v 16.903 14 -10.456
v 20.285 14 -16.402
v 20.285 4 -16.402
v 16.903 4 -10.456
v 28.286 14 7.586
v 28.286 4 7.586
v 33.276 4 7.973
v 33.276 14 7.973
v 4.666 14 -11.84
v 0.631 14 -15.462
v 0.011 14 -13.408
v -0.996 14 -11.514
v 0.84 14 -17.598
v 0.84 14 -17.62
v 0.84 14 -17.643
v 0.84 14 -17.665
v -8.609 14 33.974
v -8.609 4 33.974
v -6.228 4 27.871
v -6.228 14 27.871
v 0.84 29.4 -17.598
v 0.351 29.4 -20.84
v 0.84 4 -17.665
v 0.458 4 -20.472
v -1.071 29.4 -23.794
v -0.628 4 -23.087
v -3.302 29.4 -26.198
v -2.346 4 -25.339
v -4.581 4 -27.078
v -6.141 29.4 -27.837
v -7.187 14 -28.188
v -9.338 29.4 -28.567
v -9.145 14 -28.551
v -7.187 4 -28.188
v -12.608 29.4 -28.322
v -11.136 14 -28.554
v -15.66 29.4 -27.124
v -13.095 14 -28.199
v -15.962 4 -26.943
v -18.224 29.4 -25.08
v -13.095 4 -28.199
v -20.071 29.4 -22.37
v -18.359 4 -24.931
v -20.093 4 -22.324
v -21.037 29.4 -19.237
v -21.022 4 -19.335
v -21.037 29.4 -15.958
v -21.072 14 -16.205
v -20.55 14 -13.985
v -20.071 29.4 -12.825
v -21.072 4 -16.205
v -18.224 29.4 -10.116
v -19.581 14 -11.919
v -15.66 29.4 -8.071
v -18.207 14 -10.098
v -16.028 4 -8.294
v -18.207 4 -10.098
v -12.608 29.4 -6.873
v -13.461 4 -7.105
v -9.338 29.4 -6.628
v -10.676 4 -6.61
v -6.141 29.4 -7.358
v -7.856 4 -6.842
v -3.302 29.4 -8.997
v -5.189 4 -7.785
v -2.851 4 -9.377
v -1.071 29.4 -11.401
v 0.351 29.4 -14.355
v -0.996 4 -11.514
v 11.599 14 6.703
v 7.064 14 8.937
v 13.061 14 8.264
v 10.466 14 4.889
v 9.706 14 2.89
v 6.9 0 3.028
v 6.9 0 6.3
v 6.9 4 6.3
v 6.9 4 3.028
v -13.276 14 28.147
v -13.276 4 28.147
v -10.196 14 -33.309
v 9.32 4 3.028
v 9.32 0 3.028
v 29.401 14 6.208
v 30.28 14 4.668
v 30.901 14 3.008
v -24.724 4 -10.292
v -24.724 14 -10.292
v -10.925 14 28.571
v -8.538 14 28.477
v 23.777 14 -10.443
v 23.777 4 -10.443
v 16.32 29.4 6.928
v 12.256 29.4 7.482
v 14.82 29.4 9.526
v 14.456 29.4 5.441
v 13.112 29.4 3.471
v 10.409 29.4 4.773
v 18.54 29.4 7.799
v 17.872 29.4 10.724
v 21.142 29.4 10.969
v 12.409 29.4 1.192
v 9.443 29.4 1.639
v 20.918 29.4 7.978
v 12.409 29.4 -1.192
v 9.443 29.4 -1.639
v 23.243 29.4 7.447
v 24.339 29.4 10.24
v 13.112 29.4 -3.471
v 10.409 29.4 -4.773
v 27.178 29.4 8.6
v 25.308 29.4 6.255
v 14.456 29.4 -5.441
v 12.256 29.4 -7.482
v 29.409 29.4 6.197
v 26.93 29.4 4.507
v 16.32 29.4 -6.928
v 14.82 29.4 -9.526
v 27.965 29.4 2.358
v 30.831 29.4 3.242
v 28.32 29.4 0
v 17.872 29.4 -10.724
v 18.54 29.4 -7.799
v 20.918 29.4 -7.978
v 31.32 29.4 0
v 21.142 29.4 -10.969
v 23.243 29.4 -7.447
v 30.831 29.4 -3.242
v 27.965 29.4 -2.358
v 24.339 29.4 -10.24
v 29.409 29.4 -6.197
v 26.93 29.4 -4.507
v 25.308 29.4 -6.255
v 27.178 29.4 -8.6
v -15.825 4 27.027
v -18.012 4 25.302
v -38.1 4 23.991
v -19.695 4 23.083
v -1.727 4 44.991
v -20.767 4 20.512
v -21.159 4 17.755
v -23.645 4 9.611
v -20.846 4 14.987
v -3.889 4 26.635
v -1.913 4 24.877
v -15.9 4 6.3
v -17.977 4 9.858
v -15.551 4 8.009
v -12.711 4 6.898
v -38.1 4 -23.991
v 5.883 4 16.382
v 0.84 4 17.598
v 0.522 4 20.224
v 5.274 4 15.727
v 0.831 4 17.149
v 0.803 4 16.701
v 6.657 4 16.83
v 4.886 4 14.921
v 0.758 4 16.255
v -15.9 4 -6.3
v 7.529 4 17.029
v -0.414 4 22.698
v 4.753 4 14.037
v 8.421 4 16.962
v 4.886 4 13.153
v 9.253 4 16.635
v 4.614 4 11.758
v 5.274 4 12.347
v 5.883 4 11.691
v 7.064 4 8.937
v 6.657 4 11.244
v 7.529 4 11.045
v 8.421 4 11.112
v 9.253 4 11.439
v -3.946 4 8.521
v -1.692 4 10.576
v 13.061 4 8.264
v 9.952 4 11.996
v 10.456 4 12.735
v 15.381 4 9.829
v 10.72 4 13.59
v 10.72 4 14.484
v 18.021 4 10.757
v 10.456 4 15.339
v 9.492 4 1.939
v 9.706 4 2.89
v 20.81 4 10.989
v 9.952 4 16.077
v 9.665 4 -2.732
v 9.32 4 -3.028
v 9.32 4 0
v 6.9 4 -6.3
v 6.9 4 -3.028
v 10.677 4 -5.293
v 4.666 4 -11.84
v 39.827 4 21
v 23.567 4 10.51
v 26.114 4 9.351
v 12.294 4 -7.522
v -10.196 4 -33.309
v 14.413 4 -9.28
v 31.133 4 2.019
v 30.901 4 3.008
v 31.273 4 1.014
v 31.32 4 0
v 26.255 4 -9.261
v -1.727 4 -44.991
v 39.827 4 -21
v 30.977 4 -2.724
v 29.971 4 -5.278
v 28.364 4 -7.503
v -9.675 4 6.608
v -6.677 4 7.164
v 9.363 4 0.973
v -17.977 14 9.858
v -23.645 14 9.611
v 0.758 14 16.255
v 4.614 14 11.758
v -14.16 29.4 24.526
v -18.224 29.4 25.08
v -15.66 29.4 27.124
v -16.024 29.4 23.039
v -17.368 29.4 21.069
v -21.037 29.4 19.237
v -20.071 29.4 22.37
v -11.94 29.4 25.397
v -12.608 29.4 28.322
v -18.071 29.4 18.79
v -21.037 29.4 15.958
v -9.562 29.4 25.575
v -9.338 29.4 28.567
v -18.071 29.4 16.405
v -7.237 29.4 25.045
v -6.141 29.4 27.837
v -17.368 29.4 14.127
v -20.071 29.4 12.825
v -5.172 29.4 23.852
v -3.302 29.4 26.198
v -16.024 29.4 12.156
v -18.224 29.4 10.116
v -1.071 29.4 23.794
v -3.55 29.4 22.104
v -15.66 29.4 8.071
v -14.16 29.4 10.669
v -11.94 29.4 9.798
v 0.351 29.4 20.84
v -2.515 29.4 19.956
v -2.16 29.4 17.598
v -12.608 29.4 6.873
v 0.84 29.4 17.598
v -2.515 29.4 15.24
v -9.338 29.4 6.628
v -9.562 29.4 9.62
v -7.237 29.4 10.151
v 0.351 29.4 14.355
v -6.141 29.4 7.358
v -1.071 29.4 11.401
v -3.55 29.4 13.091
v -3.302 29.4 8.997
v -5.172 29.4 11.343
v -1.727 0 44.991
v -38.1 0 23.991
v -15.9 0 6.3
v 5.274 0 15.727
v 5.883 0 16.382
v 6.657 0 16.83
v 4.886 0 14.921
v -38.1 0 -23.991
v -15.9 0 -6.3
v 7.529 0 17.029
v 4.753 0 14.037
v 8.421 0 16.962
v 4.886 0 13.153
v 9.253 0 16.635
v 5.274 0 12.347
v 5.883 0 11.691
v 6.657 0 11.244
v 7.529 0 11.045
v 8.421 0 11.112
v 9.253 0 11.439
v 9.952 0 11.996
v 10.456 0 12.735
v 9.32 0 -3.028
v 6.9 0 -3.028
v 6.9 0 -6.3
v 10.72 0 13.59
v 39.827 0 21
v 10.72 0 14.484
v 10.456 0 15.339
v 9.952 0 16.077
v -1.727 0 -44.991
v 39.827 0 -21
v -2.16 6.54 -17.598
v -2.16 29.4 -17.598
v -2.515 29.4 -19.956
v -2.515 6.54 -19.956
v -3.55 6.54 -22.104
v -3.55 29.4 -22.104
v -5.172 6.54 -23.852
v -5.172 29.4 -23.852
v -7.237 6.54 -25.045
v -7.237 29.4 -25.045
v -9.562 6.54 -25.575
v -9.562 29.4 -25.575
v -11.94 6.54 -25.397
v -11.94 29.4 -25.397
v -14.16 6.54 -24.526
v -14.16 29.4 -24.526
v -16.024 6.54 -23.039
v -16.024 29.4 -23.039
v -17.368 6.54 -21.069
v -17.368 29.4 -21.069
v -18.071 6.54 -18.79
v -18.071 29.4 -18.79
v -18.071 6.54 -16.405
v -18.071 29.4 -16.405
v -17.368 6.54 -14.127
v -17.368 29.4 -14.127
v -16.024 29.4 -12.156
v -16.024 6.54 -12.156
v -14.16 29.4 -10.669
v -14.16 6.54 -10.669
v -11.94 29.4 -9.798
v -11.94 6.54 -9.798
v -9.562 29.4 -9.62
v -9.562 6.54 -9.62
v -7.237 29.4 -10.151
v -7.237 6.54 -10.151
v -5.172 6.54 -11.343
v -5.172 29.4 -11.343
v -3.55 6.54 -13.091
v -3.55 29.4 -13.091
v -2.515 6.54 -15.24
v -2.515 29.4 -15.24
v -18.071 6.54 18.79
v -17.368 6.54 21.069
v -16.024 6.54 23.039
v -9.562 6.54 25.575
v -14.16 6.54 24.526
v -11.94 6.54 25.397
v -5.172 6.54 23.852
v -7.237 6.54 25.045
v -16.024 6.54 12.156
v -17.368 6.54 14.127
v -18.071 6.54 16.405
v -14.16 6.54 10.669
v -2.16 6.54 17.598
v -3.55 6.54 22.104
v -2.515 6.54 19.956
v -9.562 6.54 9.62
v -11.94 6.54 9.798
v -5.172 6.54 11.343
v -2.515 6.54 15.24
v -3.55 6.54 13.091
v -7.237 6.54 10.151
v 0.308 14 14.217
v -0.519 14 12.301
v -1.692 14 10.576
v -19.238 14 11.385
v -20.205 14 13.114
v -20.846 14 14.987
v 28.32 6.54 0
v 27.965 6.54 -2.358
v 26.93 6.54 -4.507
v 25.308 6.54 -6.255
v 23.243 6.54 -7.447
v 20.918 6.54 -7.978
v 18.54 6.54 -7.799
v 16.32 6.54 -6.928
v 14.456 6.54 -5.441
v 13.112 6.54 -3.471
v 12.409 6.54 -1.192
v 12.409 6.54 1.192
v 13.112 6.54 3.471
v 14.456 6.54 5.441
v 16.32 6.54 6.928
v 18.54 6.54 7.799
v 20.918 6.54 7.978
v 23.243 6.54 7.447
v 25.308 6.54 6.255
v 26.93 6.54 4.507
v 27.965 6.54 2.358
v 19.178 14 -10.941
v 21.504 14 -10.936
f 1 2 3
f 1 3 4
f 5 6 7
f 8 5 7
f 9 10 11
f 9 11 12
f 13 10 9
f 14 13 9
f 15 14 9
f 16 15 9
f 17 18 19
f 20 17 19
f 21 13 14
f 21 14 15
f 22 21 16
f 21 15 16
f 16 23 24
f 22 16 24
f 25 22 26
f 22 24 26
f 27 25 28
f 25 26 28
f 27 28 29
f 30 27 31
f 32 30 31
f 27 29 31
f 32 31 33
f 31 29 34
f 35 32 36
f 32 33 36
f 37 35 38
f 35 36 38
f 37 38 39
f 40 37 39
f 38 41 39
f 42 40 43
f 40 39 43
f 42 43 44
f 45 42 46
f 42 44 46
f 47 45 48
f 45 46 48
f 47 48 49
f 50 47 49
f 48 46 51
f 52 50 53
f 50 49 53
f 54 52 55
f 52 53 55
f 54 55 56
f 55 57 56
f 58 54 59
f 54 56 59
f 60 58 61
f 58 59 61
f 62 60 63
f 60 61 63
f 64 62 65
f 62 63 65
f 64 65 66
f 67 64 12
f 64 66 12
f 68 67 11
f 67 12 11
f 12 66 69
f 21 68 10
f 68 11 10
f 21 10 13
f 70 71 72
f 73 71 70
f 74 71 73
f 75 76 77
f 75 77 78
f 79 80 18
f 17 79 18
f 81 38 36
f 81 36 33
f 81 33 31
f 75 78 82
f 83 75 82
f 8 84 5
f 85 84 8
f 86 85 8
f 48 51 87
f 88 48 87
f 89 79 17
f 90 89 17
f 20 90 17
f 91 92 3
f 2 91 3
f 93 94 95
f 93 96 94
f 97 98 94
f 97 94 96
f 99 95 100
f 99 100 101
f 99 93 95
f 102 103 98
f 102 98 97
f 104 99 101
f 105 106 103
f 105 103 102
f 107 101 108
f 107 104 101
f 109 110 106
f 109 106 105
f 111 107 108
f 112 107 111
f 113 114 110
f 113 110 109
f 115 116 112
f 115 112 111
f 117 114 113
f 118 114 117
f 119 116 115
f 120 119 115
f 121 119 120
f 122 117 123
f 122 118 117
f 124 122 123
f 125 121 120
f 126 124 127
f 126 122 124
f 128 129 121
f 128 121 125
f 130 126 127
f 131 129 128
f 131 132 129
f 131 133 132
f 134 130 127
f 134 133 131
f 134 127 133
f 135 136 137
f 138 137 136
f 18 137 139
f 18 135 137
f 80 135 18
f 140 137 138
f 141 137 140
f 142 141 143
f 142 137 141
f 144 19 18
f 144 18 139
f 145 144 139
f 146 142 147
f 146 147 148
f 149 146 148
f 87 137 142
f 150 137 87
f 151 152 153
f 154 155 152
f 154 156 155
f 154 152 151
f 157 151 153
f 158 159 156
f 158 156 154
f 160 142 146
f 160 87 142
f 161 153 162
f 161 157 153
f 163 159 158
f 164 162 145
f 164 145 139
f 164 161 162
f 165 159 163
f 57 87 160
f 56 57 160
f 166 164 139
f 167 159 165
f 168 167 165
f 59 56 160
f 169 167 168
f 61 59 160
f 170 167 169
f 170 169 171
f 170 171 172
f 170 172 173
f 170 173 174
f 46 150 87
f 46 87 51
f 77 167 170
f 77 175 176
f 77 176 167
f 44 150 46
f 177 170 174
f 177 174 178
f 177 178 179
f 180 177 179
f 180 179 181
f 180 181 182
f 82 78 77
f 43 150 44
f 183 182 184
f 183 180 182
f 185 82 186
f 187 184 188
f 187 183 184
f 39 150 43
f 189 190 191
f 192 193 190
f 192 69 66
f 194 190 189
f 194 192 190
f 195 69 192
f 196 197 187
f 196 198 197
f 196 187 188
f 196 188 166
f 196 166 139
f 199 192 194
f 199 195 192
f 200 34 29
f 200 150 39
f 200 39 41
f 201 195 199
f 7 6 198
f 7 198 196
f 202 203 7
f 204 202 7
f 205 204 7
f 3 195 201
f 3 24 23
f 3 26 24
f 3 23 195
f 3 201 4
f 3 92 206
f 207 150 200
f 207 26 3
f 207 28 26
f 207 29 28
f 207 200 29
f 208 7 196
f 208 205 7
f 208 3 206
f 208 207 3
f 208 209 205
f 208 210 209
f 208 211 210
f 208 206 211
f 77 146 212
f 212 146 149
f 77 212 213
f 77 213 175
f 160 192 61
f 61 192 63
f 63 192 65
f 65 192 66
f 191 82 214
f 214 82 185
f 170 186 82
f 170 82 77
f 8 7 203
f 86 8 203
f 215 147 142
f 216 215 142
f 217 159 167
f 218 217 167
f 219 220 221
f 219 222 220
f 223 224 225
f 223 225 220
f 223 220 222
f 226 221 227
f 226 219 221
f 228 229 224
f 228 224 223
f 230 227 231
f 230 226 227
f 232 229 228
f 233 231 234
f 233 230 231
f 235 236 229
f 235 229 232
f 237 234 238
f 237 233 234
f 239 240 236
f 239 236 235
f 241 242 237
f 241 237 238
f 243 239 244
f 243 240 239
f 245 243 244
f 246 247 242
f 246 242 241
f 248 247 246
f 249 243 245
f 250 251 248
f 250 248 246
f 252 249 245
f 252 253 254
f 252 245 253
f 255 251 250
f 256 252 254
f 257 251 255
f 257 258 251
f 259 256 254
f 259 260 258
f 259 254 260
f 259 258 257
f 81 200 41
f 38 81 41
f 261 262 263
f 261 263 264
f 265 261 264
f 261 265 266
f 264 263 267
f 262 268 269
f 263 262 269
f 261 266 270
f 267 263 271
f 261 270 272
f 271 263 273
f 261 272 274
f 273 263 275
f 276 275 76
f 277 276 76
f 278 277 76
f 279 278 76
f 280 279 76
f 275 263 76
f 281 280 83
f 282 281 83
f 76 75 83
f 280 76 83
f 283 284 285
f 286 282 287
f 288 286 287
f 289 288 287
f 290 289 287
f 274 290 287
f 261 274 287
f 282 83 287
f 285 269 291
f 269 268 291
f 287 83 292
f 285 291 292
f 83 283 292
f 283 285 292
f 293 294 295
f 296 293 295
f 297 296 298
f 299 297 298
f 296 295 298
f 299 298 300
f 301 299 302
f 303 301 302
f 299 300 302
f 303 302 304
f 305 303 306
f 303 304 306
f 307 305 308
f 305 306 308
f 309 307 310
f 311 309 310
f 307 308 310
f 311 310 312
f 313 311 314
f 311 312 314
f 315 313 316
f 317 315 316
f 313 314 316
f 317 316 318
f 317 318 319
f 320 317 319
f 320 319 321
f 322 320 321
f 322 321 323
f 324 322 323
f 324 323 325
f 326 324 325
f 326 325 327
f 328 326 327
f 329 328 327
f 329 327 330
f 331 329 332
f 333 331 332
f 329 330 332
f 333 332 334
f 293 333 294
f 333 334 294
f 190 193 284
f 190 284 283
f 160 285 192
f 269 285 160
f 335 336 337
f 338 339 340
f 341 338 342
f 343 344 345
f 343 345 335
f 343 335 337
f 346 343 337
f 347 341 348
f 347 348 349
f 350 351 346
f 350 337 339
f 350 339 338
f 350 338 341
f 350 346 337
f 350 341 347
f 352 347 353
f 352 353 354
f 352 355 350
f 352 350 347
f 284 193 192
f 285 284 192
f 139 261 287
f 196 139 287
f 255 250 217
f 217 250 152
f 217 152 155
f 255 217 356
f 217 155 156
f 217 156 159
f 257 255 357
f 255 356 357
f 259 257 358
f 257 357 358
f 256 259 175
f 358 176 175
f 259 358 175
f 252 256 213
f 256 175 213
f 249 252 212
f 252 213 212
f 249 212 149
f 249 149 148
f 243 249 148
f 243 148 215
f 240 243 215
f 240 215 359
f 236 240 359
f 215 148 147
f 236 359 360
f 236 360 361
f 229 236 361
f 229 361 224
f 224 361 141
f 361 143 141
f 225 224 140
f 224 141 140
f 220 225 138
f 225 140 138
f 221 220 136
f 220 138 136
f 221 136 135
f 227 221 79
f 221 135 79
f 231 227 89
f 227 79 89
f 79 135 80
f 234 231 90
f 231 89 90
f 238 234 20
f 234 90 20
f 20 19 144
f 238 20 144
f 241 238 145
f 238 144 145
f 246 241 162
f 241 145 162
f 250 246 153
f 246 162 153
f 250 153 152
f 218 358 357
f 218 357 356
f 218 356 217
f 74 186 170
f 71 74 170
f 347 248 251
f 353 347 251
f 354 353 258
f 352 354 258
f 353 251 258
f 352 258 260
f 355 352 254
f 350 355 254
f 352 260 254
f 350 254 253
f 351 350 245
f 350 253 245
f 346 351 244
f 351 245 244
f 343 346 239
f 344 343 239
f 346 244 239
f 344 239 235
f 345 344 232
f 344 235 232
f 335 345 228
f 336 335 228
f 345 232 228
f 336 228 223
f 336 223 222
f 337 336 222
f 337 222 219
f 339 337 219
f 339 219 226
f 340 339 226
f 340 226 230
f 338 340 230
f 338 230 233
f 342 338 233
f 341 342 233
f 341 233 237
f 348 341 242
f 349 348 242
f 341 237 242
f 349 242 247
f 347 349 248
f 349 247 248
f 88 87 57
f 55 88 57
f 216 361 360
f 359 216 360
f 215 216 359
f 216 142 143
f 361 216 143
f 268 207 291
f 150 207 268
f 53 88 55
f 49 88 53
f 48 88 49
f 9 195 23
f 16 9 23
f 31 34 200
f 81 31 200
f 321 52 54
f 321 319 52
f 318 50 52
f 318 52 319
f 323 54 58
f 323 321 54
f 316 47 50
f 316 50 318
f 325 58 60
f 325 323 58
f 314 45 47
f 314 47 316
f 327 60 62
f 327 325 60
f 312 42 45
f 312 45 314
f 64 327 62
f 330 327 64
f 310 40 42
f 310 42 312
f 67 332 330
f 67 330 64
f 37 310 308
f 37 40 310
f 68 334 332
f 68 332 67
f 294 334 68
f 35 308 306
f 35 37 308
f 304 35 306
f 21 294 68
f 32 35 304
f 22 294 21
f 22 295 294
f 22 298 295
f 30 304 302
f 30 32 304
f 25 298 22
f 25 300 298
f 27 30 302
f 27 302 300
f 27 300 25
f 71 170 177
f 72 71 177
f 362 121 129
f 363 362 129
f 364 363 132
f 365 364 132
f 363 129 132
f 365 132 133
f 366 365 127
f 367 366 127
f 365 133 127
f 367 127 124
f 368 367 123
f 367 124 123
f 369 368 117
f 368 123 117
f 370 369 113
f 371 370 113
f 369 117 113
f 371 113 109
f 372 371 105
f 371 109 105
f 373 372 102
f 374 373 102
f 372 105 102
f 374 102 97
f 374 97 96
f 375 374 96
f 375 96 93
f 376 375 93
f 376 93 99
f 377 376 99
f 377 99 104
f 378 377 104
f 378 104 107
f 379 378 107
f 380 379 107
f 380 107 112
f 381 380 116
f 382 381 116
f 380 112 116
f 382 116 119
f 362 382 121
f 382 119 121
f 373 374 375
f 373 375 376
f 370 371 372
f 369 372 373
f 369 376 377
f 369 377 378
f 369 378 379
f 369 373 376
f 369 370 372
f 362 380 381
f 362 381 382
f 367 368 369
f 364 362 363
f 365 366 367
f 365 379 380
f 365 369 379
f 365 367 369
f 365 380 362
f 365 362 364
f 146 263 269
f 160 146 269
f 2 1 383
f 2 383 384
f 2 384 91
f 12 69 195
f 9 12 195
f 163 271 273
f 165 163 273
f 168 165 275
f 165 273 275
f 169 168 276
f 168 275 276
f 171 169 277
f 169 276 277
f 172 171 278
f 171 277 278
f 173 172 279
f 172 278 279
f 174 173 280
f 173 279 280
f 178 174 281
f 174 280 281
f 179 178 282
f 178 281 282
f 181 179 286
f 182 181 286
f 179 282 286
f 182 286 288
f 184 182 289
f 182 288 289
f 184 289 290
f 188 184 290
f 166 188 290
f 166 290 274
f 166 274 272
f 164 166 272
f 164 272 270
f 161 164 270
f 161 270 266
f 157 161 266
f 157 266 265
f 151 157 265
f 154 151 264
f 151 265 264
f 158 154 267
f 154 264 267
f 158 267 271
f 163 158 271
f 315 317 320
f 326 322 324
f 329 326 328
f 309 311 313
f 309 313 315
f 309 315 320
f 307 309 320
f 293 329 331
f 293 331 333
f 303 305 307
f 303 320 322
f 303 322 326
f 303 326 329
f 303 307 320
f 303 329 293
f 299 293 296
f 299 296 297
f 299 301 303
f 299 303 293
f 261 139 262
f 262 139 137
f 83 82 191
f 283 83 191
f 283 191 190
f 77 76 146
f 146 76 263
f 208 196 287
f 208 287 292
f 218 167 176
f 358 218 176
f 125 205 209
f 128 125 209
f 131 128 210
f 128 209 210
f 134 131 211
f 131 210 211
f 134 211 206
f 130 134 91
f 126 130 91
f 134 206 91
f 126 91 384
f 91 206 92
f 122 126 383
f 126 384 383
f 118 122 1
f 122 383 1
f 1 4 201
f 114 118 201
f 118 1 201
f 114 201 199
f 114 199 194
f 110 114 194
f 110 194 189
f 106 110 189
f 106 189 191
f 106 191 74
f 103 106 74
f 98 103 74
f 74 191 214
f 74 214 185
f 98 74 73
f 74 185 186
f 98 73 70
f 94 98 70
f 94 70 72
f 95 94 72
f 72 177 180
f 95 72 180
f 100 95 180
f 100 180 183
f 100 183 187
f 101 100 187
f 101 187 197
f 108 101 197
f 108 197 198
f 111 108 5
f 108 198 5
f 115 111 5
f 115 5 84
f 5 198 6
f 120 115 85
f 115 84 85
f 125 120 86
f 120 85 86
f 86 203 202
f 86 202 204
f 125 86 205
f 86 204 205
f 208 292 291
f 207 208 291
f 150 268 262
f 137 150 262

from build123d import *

# Parameters (mm, degrees)
BOSS_EXTRUDE1_DEPTH = 4
SKETCH2_R           = 11
BOSS_EXTRUDE2_DEPTH = 25.4
SKETCH3_R           = 8
CUT_EXTRUDE1_DEPTH  = 22.86
CUT_EXTRUDE2_DEPTH  = 22.86
SKETCH5_R           = 3
SKETCH5_W           = 22.8
SKETCH5_H           = 12.6
CUT_EXTRUDE3_DEPTH  = 4
BOSS_EXTRUDE3_DEPTH = 10
SKETCH7_W           = 4.84
SKETCH7_H           = 6.056432248
CUT_EXTRUDE4_DEPTH  = 10


with BuildPart() as part:
    # Sketch1 → Boss-Extrude1 (new body)
    with BuildSketch(Plane(origin=(0, 0, 0), x_dir=(1, 0, 0), z_dir=(0, 1, 0))):
        Polygon((76.2, 0), (-38.1, 65.991135768), (-38.1, -65.991135768), align=None)
    extrude(amount=BOSS_EXTRUDE1_DEPTH)

    # Sketch2 → Boss-Extrude2 (add)
    with BuildSketch(Plane(origin=(0, 4, 0), x_dir=(1, 0, 0), z_dir=(0, 1, 0))):
        with Locations((20.32, 0)):
            Circle(SKETCH2_R)
        with Locations((-10.16, 17.597636205)):
            Circle(SKETCH2_R)
        with Locations((-10.16, -17.597636205)):
            Circle(SKETCH2_R)
    extrude(amount=BOSS_EXTRUDE2_DEPTH)

    # Sketch3 → Cut-Extrude1 (cut)
    with BuildSketch(Plane(origin=(0, 29.4, 0), x_dir=(1, 0, 0), z_dir=(0, 1, 0))):
        with Locations((-10.16, 17.597636205)):
            Circle(SKETCH3_R)
        with Locations((20.32, 0)):
            Circle(SKETCH3_R)
        with Locations((-10.16, -17.597636205)):
            Circle(SKETCH3_R)
    extrude(amount=-CUT_EXTRUDE1_DEPTH, mode=Mode.SUBTRACT)

    # Sketch4 → Cut-Extrude2 (cut)
    with BuildSketch(Plane(origin=(0, 4, 0), x_dir=(1, 0, 0), z_dir=(0, 1, 0))):
        Polygon((-38.1, 65.991135768), (-1.726933041, 44.991135768), (-38.1, 23.991135768), align=None)
        Polygon((-38.1, -65.991135768), (-1.726933041, -44.991135768), (-38.1, -23.991135768), align=None)
        Polygon((76.2, 0), (39.826933041, -21), (39.826933041, 21), align=None)
    extrude(amount=-CUT_EXTRUDE2_DEPTH, mode=Mode.SUBTRACT)

    # Sketch5 → Cut-Extrude3 (cut)
    with BuildSketch(Plane(origin=(0, 0, 0), x_dir=(-1, 0, 0), z_dir=(0, -1, 0))):
        with Locations((-7.753054986, -14.0369452)):
            Circle(SKETCH5_R)
        with Locations((4.5, 0)):
            Rectangle(SKETCH5_W, SKETCH5_H)
    extrude(amount=-CUT_EXTRUDE3_DEPTH, mode=Mode.SUBTRACT)

    # Sketch6 → Boss-Extrude3 (add)
    with BuildSketch(Plane(origin=(0, 4, 0), x_dir=(1, 0, 0), z_dir=(0, 1, 0))):
        Polygon((-6.061319385, 26.273055398), (-10.196194275, 33.309488143), (-14.22248634, 26.210365074), align=None)
        Polygon((-15.553445676, 10.019414489), (-19.902730969, 18.097665314), (-24.724058755, 10.291948349), align=None)
        Polygon((4.666083615, 11.839822271), (-0.028890737, 18.987902238), (-3.871822401, 11.347895195), align=None)
        Polygon((25.015642032, 8.329035834), (20.285301804, 16.40202737), (15.659056164, 8.268936796), align=None)
        Polygon((33.276250833, -7.973152462), (30.121872493, -1.379377193), (25.988684773, -7.408036604), align=None)
        Polygon((15.659056164, -7.973152462), (10.527139401, -1.011359201), (7.064007962, -8.936626119), align=None)
        Polygon((-15.553445676, -9.963714295), (-23.645110056, -9.611162466), (-19.904596706, -16.795025293), align=None)
        Polygon((-5.170207238, -25.158366131), (-14.52400497, -26.588552978), (-8.608527963, -33.974086013), align=None)
        Polygon((-0.901197828, -18.18923766), (4.614077612, -11.758341231), (-3.712879784, -10.197420805), align=None)
    extrude(amount=BOSS_EXTRUDE3_DEPTH)

    # Sketch7 → Cut-Extrude4 (cut)
    with BuildSketch(Plane(origin=(0, 4, 0), x_dir=(1, 0, 0), z_dir=(0, 1, 0))):
        with Locations((6.9, 0)):
            Rectangle(SKETCH7_W, SKETCH7_H)
    extrude(amount=-CUT_EXTRUDE4_DEPTH, mode=Mode.SUBTRACT)


solid = part.part
